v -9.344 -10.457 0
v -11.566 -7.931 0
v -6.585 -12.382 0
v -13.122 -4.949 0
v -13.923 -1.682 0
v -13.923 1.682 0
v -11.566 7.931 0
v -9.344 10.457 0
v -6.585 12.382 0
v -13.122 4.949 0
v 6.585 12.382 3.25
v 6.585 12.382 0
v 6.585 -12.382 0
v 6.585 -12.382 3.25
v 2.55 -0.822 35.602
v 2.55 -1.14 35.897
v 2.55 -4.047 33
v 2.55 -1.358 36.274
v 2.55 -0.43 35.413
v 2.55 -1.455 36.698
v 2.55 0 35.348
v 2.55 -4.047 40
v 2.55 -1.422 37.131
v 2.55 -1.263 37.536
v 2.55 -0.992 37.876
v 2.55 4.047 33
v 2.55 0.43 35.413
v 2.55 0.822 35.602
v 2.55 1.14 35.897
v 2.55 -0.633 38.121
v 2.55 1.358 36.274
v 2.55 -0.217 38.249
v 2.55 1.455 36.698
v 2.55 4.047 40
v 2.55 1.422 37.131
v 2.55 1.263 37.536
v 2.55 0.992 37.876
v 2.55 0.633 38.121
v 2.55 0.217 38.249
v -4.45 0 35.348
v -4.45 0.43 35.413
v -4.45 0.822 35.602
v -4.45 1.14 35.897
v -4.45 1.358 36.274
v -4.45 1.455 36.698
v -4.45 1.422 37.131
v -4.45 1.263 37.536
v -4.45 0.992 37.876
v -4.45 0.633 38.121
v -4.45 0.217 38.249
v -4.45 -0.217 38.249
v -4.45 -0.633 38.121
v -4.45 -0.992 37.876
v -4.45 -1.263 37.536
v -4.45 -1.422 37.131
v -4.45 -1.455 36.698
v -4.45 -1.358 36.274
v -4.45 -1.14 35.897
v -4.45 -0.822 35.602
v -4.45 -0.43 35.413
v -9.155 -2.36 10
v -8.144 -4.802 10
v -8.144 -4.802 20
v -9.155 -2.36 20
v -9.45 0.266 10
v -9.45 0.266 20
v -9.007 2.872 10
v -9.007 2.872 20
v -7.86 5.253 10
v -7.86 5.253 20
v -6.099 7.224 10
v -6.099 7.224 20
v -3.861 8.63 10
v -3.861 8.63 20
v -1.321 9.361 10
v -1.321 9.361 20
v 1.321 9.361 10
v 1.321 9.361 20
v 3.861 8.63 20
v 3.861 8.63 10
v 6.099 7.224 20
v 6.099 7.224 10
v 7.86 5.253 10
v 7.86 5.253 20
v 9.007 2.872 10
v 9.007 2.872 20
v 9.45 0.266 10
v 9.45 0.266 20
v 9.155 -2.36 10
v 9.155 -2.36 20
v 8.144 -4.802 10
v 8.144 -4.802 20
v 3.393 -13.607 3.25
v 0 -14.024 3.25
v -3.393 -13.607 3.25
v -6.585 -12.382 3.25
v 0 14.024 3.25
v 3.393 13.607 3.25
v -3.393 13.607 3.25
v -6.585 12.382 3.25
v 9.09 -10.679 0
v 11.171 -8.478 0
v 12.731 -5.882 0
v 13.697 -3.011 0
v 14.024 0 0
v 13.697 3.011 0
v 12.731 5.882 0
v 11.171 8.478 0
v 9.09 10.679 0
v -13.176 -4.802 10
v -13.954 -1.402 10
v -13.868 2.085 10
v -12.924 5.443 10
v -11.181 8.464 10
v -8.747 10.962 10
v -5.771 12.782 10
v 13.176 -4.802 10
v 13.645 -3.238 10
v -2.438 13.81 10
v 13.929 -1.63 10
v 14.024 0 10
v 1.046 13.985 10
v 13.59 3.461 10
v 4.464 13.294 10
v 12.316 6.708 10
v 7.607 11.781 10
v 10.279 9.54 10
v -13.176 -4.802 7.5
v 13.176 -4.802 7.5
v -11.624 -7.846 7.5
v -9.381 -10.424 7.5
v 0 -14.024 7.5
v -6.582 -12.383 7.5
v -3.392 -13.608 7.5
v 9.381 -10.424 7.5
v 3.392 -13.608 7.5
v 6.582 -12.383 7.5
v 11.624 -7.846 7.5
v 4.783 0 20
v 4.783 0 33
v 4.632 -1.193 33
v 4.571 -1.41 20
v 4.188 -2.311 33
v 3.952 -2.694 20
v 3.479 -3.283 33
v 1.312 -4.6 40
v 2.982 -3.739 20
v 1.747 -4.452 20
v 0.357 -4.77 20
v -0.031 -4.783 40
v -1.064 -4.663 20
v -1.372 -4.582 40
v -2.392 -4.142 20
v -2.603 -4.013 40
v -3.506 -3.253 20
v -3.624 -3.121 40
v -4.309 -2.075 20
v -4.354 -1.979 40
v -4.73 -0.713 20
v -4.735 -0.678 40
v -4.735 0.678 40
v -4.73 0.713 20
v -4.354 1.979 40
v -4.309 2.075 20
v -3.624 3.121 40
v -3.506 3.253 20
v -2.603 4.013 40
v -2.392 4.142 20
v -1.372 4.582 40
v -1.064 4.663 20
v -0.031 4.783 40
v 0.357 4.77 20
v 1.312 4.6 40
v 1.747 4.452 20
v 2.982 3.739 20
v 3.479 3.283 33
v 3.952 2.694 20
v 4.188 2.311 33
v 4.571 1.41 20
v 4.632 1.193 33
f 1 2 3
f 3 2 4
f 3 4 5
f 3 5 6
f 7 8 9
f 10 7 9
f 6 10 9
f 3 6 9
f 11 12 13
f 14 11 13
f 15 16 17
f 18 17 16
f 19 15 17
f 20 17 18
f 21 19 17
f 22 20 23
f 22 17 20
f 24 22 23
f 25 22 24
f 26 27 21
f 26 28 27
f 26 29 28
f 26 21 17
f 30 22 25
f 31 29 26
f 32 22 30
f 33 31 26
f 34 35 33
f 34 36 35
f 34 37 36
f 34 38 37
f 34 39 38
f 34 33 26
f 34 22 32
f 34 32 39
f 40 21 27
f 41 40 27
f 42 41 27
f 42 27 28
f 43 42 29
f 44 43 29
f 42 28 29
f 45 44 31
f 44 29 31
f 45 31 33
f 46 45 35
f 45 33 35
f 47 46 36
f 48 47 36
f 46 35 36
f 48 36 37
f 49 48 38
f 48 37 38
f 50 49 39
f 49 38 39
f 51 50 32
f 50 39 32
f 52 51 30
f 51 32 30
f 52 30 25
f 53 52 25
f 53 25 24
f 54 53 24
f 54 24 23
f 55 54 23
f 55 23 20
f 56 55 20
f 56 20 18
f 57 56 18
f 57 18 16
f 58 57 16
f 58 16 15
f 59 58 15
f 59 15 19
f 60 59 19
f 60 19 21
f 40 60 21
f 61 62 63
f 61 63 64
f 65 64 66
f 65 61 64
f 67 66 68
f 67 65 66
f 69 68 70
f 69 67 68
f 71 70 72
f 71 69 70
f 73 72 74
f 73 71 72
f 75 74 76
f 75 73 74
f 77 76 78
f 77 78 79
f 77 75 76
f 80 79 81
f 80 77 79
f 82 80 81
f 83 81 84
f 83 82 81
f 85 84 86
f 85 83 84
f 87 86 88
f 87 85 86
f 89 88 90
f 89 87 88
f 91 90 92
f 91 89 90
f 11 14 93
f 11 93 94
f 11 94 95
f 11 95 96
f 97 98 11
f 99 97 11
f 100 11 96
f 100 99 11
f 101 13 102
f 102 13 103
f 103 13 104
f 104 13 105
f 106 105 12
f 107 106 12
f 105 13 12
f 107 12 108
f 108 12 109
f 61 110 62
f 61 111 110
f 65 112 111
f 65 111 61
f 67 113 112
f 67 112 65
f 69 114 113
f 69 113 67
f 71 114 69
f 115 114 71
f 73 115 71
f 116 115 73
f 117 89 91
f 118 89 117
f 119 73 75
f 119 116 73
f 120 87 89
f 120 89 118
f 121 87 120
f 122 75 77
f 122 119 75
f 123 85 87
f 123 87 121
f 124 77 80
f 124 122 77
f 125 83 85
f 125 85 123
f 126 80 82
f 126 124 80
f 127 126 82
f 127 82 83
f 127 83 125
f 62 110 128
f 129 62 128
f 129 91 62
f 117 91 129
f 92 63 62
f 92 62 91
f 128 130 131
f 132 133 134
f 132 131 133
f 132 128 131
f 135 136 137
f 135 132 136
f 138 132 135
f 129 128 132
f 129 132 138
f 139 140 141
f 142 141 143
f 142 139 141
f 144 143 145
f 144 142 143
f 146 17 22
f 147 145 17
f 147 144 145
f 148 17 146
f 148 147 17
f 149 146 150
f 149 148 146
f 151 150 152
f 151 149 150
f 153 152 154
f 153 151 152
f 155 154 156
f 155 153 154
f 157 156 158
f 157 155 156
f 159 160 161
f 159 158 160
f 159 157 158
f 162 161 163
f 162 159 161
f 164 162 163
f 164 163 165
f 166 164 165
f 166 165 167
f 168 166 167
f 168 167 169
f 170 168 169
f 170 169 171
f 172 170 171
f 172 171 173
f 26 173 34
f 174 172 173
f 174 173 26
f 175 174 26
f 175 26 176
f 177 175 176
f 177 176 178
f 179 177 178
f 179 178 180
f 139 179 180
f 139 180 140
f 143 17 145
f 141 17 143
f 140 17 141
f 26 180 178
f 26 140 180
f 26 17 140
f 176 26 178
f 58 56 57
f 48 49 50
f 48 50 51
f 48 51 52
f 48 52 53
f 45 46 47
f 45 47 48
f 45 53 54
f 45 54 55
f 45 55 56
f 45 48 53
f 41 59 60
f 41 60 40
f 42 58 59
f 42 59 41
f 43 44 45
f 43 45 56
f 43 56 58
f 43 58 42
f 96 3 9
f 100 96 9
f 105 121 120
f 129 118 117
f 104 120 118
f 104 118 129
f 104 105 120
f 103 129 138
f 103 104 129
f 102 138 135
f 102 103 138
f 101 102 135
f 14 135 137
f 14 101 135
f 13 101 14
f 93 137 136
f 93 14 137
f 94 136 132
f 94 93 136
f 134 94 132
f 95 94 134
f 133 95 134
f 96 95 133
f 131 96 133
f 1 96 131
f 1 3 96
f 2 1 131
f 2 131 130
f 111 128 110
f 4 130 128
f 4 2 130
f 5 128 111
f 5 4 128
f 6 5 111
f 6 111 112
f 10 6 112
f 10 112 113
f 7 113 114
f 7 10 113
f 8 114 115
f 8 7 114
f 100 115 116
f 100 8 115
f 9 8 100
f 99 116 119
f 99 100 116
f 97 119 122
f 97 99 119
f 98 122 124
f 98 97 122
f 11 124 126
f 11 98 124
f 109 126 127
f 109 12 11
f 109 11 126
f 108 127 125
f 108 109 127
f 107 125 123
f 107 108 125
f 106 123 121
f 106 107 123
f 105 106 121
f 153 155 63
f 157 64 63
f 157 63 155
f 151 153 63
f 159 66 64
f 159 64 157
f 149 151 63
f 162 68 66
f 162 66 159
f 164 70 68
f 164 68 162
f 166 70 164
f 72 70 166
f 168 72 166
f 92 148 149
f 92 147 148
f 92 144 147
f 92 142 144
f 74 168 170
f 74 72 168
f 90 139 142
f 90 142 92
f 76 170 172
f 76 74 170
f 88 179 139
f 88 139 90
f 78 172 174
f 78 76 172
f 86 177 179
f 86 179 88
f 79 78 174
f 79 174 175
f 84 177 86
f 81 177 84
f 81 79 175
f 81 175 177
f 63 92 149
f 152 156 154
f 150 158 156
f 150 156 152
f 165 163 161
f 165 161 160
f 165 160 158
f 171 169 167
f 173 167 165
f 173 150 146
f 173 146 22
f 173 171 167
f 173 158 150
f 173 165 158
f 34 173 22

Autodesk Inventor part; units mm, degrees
ref_plane "YZ Plane" through (0, 0, 0) normal (1, 0, 0) x (0, 1, 0)
ref_plane "XZ Plane" through (0, 0, 0) normal (0, 1, 0) x (-1, 0, 0)
ref_plane "XY Plane" through (0, 0, 0) normal (0, 0, 1) x (1, 0, 0)
sketch "스케치1" plane through (0, 0, 0) normal (0, 0, 1) x (1, 0, 0)
  circle A0 centre (0, 0) radius 14.0239
extrude "돌출1" add sketch "스케치1" along normal blind 10
sketch "스케치2" plane through (0, 0, 10) normal (0, 0, 1) x (1, 0, 0)
  circle A0 centre (0, 0) radius 9.454
extrude "돌출2" add sketch "스케치2" along normal blind 10
sketch "스케치3" plane through (0, 0, 20) normal (0, 0, 1) x (1, 0, 0)
  circle A0 centre (0, 0) radius 4.783
extrude "돌출3" add sketch "스케치3" along normal blind 20
sketch "스케치4" plane through (0, 0, 40) normal (0, 0, 1) x (1, 0, 0)
  circle A0 centre (0, 0) radius 4.783 projected
  line L0 (7.0161, -4.0466) -> (2.5499, -4.0466)
  line L1 (2.5499, -4.0466) -> (2.5499, 4.0466)
  line L2 (2.5499, 4.0466) -> (7.0161, 4.0466)
  line L3 (7.0161, 4.0466) -> (7.0161, -4.0466)
  circle A1 centre (0, 0) radius 4.783 projected
  line L4 (7.0161, -4.0466) -> (2.5499, 4.0466) construction
  line L5 (2.5499, -4.0466) -> (7.0161, 4.0466) construction
  point P0 (4.783, 0)
extrude "돌출4" cut sketch "스케치4" against normal blind 7 contours A0 L1 | A0 L2 L3 L0 picked at (3.2943, 0)
sketch "스케치5" plane through (2.5499, -4.0466, 40) normal (1, 0, 0) x (0, 0, -1)
  circle A0 centre (3.1932, 4.0466) radius 1.4587
  point P0 (40, 4.0466)
extrude "돌출5" cut sketch "스케치5" against normal blind 7
sketch "스케치6" plane through (0, 0, 20) normal (0, 0, 1) x (1, 0, 0)
  circle A0 centre (0, 0) radius 14.0239 projected
  line L0 (13.1762, -23.246) -> (-13.1762, -23.246)
  line L1 (-13.1762, -23.246) -> (-13.1762, -4.8019)
  line L2 (-13.1762, -4.8019) -> (13.1762, -4.8019)
  line L3 (13.1762, -4.8019) -> (13.1762, -23.246)
  line L4 (13.1762, -23.246) -> (-13.1762, -4.8019) construction
  line L5 (-13.1762, -23.246) -> (13.1762, -4.8019) construction
  point P0 (0, -14.0239)
extrude "돌출6" cut sketch "스케치6" against normal blind 12.5 contours L2 A0 | A0 L3 L0 L1 picked at (-1.1305, -9.7665)
sketch "스케치7" plane through (0, 0, 0) normal (0, 0, -1) x (-1, 0, 0)
  line L0 (6.585, 15.6352) -> (-6.585, 15.6352)
  line L1 (-6.585, 15.6352) -> (-6.585, -15.6352)
  line L2 (-6.585, -15.6352) -> (6.585, -15.6352)
  line L3 (6.585, -15.6352) -> (6.585, 15.6352)
  line L4 (6.585, 15.6352) -> (-6.585, -15.6352) construction
  line L5 (-6.585, 15.6352) -> (6.585, -15.6352) construction
  point P0 (0, 0)
extrude "돌출7" cut sketch "스케치7" against normal blind 3.25
properties part number "240628_final4"
